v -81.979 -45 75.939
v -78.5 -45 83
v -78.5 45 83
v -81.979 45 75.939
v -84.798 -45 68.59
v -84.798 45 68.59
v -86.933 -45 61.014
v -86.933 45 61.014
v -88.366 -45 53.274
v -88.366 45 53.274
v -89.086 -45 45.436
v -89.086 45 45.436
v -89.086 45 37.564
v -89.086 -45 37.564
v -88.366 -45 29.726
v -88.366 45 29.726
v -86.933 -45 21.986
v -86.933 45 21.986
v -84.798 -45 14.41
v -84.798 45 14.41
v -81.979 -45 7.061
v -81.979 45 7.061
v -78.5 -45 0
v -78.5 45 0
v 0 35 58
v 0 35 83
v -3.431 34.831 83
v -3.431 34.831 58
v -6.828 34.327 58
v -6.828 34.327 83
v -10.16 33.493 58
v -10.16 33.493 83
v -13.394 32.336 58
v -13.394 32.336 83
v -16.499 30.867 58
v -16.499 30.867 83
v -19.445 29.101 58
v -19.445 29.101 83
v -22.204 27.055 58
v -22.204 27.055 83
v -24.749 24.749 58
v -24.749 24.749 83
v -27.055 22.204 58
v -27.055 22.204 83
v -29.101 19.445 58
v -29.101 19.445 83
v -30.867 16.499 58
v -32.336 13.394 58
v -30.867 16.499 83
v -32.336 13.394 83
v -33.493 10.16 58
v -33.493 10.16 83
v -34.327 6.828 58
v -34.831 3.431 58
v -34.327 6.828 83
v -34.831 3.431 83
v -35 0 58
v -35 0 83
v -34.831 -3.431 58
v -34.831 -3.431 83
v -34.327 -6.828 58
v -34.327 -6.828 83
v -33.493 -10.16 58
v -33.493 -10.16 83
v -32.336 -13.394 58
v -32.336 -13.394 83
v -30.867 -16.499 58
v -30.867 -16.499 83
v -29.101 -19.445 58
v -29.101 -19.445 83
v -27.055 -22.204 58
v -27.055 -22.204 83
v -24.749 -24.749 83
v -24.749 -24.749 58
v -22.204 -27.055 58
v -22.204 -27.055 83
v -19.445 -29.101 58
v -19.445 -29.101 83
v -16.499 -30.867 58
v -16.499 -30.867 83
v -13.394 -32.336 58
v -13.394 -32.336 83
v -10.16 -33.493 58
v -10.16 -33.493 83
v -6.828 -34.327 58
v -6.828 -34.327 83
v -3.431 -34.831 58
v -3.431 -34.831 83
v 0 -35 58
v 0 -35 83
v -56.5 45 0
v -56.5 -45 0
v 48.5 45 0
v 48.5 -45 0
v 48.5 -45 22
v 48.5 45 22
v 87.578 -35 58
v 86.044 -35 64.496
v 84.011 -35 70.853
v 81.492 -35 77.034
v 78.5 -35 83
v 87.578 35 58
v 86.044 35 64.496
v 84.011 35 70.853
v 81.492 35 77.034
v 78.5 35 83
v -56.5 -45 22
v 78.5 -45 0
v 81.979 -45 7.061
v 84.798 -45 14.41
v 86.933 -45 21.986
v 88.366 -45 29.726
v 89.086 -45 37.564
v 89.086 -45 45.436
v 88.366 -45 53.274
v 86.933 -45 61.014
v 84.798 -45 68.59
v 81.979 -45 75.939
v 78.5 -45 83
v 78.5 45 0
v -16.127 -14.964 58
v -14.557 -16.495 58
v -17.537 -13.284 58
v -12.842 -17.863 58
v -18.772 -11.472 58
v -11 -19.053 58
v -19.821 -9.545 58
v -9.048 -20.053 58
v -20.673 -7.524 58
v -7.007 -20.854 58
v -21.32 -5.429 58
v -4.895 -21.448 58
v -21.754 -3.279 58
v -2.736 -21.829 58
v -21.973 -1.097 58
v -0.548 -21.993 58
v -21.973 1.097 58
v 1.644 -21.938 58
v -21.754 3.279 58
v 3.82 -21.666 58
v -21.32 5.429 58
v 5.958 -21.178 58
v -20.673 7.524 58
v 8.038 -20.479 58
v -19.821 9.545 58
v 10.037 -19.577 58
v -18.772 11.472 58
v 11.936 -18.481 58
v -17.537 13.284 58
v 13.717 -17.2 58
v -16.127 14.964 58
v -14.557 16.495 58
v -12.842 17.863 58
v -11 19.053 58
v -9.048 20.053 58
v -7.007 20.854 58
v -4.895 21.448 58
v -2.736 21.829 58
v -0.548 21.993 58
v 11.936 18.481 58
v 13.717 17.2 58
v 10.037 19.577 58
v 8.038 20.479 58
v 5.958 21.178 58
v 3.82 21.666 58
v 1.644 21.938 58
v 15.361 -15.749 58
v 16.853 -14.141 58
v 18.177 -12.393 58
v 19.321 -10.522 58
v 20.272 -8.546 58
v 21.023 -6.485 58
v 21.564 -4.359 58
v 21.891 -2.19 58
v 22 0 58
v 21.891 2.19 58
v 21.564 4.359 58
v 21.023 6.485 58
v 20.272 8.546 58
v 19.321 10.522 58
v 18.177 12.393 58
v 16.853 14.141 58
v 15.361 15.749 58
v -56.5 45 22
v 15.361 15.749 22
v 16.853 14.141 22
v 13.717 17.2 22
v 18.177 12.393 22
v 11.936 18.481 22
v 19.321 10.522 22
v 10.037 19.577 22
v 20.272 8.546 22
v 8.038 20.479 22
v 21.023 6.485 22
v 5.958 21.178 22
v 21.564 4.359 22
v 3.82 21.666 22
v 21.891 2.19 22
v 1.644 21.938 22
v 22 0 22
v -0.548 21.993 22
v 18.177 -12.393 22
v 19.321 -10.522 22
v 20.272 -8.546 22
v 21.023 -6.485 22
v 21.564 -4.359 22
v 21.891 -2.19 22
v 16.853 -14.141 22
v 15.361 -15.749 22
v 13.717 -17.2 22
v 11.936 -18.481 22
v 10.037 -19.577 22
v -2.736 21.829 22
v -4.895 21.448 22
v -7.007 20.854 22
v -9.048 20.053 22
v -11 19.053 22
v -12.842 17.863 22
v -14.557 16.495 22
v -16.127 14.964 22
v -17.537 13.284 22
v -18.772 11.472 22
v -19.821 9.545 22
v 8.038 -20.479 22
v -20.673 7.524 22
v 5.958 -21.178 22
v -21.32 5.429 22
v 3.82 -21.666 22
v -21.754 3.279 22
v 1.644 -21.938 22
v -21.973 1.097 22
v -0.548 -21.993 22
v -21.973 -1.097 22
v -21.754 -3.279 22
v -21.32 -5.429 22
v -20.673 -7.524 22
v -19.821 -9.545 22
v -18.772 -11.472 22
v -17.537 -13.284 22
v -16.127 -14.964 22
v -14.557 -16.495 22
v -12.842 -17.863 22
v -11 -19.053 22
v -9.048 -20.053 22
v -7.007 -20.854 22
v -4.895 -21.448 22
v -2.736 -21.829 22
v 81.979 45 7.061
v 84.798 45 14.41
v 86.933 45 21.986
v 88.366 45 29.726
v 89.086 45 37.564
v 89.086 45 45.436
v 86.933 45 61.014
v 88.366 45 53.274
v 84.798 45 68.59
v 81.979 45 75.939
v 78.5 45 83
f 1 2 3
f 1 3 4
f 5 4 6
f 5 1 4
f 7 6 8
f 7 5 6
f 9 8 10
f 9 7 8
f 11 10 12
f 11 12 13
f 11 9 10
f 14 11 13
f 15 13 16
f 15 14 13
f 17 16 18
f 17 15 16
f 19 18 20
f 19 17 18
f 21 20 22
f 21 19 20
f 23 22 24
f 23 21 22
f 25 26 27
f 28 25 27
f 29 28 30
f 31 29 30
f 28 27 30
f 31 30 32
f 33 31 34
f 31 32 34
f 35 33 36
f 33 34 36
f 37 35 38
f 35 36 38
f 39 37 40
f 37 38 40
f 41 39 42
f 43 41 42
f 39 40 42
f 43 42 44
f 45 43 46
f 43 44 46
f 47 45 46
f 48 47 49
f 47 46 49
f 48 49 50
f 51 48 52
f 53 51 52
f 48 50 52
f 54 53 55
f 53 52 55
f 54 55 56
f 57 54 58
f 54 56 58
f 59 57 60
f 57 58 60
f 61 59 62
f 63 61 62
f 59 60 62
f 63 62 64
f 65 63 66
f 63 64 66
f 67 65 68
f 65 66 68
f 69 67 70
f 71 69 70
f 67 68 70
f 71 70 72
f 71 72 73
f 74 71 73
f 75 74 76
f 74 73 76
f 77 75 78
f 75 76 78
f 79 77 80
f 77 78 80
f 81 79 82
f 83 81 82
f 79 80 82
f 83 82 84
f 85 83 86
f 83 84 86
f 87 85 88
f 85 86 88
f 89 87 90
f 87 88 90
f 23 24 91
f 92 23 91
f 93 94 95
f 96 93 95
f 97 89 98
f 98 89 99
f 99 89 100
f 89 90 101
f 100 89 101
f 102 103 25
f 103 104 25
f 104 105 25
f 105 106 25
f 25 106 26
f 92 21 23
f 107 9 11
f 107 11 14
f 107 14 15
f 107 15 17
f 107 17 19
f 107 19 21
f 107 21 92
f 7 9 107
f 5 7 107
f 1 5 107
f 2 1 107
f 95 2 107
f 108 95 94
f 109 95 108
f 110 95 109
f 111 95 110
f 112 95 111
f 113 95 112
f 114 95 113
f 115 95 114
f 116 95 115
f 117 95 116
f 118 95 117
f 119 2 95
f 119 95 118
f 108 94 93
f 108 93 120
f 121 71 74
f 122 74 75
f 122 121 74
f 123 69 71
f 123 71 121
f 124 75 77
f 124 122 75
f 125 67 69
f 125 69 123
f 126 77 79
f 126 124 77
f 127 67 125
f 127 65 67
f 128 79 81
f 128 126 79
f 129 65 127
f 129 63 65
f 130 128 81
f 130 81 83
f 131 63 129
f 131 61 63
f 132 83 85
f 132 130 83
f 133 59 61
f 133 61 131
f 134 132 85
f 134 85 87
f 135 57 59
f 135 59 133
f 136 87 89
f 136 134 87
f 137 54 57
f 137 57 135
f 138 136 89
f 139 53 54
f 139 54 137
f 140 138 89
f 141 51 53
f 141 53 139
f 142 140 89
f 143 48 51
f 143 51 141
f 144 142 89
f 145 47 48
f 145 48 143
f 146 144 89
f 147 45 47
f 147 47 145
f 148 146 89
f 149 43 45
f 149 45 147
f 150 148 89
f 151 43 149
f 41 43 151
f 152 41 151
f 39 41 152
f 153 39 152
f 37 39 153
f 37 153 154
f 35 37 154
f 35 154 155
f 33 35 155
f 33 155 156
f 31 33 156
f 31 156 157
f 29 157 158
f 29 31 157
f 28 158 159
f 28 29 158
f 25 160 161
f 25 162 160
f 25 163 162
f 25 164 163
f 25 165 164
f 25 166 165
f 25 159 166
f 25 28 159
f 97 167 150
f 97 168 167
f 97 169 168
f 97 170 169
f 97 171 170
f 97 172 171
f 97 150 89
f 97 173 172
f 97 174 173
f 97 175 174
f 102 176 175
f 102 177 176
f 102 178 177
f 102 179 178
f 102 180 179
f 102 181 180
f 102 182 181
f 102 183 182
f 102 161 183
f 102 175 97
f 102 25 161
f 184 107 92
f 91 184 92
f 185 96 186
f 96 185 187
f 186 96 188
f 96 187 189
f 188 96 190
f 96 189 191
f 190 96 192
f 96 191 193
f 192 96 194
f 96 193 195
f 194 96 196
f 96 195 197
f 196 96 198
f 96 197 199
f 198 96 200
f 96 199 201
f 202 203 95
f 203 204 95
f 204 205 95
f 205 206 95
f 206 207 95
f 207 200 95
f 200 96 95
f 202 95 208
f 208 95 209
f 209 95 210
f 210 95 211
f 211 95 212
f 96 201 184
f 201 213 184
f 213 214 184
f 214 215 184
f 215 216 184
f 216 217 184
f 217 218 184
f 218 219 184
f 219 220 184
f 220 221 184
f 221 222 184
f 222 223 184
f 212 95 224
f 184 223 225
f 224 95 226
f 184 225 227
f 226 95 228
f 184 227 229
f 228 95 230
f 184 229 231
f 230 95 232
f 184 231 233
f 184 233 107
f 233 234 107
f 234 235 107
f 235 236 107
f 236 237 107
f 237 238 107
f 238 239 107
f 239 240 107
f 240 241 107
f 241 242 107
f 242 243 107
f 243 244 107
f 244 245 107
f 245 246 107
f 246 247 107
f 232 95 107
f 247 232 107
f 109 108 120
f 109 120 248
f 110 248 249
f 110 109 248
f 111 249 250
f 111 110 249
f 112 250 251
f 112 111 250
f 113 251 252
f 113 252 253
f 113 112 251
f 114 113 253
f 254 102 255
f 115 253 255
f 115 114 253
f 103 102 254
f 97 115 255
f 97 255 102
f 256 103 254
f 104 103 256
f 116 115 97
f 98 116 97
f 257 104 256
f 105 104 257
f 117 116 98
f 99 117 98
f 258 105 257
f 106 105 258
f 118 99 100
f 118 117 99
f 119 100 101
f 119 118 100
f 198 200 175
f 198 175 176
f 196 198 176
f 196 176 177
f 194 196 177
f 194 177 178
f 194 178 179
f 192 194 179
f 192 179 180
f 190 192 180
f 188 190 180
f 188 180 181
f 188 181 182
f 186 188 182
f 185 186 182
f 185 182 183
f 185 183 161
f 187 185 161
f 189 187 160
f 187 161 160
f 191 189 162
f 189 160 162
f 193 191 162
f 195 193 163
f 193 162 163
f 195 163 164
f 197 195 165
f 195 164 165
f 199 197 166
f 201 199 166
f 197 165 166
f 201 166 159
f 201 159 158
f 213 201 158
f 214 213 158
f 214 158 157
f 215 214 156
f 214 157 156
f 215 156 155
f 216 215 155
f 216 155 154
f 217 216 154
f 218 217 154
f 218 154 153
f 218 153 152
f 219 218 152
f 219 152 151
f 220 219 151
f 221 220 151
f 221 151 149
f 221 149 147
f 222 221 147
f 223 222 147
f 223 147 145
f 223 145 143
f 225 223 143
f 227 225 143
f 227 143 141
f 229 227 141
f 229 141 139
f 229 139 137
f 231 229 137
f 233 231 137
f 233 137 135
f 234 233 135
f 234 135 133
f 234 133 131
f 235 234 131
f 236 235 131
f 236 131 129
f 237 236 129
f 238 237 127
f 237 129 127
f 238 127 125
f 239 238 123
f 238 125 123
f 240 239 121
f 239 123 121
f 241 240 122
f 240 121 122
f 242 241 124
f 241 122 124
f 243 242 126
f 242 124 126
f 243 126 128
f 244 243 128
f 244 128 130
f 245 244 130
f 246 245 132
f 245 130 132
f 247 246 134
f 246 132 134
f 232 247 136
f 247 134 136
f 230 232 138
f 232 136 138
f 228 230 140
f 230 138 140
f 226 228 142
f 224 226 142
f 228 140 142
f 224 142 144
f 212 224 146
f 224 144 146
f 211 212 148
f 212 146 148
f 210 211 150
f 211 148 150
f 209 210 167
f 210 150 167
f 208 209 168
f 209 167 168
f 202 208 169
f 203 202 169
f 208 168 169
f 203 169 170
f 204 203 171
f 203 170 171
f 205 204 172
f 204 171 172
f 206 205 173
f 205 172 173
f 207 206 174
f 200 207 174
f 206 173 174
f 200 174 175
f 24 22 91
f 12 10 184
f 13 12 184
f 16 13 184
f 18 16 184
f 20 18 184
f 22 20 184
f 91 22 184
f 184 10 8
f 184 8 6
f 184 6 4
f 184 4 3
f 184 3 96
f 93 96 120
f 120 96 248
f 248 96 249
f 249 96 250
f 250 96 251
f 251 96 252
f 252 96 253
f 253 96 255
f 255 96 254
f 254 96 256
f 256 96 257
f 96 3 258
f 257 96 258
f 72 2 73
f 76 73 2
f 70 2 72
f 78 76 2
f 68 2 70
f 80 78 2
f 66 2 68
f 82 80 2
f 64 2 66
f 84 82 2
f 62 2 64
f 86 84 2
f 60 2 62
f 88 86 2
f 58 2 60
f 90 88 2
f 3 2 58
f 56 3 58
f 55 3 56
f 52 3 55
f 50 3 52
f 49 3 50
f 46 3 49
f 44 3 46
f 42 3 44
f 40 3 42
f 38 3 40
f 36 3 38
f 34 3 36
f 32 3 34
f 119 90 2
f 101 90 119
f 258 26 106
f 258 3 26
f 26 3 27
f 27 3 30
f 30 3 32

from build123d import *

# Parameters (mm, degrees)
F0_W      = 157
F0_H      = 90
F1_DEPTH  = 83
F3_DEPTH  = 90
F5_DEPTH  = 557
F6_R      = 22
F7_DEPTH  = 25
F7_FACE_R = 22
F8_DEPTH  = 185


with BuildPart() as f1:
    # F0 (on Top) → F1 (new body)
    with BuildSketch(Plane.XY):
        Rectangle(F0_W, F0_H)
    extrude(amount=F1_DEPTH)

    # F2 (on face) → F3 (join, through all)
    with BuildSketch(Plane.XZ.offset(45)):
        with BuildLine():
            Line((-78.5, 0), (-78.5, 83))
            ThreePointArc((-78.5, 83), (-89.175701, 41.5), (-78.5, 0))
        make_face()
        with BuildLine():
            ThreePointArc((78.5, 0), (89.175701, 41.5), (78.5, 83))
            Line((78.5, 83), (78.5, 0))
        make_face()
    extrude(amount=-F3_DEPTH)

    # F4 (on face) → F5 (cut)
    with BuildSketch(Plane.XZ.offset(45)):
        Polygon((-56.5, 0), (-4, 0), (48.5, 0), (48.5, 22), (-56.5, 22), align=None)
    extrude(amount=-F5_DEPTH, mode=Mode.SUBTRACT)

    # F6 (on face) → F7 (cut)
    with BuildSketch(Plane.XY.offset(83)):
        with BuildLine():
            ThreePointArc((0, -35), (24.748737, -24.748737), (35, 0))
            ThreePointArc((35, 0), (24.748737, 24.748737), (0, 35))
            ThreePointArc((0, 35), (-35, 0), (0, -35))
        make_face()
        Circle(F6_R, mode=Mode.SUBTRACT)
        with BuildLine():
            ThreePointArc((0, 35), (24.748737, 24.748737), (35, 0))
            ThreePointArc((35, 0), (24.748737, -24.748737), (0, -35))
            Line((0, -35), (78.5, -35))
            Line((78.5, -35), (78.5, 35))
            Line((78.5, 35), (0, 35))
        make_face()
        Polygon((93.384914, 35), (78.5, 35), (78.5, -35), (92.262775, -35), (93.384914, -35.542417), align=None)
    extrude(amount=-F7_DEPTH, mode=Mode.SUBTRACT)

    # F7_face (on face) → F8 (cut)
    with BuildSketch(Plane.XY.offset(83)):
        Circle(F7_FACE_R)
    extrude(amount=-F8_DEPTH, mode=Mode.SUBTRACT)


solid = f1.part
